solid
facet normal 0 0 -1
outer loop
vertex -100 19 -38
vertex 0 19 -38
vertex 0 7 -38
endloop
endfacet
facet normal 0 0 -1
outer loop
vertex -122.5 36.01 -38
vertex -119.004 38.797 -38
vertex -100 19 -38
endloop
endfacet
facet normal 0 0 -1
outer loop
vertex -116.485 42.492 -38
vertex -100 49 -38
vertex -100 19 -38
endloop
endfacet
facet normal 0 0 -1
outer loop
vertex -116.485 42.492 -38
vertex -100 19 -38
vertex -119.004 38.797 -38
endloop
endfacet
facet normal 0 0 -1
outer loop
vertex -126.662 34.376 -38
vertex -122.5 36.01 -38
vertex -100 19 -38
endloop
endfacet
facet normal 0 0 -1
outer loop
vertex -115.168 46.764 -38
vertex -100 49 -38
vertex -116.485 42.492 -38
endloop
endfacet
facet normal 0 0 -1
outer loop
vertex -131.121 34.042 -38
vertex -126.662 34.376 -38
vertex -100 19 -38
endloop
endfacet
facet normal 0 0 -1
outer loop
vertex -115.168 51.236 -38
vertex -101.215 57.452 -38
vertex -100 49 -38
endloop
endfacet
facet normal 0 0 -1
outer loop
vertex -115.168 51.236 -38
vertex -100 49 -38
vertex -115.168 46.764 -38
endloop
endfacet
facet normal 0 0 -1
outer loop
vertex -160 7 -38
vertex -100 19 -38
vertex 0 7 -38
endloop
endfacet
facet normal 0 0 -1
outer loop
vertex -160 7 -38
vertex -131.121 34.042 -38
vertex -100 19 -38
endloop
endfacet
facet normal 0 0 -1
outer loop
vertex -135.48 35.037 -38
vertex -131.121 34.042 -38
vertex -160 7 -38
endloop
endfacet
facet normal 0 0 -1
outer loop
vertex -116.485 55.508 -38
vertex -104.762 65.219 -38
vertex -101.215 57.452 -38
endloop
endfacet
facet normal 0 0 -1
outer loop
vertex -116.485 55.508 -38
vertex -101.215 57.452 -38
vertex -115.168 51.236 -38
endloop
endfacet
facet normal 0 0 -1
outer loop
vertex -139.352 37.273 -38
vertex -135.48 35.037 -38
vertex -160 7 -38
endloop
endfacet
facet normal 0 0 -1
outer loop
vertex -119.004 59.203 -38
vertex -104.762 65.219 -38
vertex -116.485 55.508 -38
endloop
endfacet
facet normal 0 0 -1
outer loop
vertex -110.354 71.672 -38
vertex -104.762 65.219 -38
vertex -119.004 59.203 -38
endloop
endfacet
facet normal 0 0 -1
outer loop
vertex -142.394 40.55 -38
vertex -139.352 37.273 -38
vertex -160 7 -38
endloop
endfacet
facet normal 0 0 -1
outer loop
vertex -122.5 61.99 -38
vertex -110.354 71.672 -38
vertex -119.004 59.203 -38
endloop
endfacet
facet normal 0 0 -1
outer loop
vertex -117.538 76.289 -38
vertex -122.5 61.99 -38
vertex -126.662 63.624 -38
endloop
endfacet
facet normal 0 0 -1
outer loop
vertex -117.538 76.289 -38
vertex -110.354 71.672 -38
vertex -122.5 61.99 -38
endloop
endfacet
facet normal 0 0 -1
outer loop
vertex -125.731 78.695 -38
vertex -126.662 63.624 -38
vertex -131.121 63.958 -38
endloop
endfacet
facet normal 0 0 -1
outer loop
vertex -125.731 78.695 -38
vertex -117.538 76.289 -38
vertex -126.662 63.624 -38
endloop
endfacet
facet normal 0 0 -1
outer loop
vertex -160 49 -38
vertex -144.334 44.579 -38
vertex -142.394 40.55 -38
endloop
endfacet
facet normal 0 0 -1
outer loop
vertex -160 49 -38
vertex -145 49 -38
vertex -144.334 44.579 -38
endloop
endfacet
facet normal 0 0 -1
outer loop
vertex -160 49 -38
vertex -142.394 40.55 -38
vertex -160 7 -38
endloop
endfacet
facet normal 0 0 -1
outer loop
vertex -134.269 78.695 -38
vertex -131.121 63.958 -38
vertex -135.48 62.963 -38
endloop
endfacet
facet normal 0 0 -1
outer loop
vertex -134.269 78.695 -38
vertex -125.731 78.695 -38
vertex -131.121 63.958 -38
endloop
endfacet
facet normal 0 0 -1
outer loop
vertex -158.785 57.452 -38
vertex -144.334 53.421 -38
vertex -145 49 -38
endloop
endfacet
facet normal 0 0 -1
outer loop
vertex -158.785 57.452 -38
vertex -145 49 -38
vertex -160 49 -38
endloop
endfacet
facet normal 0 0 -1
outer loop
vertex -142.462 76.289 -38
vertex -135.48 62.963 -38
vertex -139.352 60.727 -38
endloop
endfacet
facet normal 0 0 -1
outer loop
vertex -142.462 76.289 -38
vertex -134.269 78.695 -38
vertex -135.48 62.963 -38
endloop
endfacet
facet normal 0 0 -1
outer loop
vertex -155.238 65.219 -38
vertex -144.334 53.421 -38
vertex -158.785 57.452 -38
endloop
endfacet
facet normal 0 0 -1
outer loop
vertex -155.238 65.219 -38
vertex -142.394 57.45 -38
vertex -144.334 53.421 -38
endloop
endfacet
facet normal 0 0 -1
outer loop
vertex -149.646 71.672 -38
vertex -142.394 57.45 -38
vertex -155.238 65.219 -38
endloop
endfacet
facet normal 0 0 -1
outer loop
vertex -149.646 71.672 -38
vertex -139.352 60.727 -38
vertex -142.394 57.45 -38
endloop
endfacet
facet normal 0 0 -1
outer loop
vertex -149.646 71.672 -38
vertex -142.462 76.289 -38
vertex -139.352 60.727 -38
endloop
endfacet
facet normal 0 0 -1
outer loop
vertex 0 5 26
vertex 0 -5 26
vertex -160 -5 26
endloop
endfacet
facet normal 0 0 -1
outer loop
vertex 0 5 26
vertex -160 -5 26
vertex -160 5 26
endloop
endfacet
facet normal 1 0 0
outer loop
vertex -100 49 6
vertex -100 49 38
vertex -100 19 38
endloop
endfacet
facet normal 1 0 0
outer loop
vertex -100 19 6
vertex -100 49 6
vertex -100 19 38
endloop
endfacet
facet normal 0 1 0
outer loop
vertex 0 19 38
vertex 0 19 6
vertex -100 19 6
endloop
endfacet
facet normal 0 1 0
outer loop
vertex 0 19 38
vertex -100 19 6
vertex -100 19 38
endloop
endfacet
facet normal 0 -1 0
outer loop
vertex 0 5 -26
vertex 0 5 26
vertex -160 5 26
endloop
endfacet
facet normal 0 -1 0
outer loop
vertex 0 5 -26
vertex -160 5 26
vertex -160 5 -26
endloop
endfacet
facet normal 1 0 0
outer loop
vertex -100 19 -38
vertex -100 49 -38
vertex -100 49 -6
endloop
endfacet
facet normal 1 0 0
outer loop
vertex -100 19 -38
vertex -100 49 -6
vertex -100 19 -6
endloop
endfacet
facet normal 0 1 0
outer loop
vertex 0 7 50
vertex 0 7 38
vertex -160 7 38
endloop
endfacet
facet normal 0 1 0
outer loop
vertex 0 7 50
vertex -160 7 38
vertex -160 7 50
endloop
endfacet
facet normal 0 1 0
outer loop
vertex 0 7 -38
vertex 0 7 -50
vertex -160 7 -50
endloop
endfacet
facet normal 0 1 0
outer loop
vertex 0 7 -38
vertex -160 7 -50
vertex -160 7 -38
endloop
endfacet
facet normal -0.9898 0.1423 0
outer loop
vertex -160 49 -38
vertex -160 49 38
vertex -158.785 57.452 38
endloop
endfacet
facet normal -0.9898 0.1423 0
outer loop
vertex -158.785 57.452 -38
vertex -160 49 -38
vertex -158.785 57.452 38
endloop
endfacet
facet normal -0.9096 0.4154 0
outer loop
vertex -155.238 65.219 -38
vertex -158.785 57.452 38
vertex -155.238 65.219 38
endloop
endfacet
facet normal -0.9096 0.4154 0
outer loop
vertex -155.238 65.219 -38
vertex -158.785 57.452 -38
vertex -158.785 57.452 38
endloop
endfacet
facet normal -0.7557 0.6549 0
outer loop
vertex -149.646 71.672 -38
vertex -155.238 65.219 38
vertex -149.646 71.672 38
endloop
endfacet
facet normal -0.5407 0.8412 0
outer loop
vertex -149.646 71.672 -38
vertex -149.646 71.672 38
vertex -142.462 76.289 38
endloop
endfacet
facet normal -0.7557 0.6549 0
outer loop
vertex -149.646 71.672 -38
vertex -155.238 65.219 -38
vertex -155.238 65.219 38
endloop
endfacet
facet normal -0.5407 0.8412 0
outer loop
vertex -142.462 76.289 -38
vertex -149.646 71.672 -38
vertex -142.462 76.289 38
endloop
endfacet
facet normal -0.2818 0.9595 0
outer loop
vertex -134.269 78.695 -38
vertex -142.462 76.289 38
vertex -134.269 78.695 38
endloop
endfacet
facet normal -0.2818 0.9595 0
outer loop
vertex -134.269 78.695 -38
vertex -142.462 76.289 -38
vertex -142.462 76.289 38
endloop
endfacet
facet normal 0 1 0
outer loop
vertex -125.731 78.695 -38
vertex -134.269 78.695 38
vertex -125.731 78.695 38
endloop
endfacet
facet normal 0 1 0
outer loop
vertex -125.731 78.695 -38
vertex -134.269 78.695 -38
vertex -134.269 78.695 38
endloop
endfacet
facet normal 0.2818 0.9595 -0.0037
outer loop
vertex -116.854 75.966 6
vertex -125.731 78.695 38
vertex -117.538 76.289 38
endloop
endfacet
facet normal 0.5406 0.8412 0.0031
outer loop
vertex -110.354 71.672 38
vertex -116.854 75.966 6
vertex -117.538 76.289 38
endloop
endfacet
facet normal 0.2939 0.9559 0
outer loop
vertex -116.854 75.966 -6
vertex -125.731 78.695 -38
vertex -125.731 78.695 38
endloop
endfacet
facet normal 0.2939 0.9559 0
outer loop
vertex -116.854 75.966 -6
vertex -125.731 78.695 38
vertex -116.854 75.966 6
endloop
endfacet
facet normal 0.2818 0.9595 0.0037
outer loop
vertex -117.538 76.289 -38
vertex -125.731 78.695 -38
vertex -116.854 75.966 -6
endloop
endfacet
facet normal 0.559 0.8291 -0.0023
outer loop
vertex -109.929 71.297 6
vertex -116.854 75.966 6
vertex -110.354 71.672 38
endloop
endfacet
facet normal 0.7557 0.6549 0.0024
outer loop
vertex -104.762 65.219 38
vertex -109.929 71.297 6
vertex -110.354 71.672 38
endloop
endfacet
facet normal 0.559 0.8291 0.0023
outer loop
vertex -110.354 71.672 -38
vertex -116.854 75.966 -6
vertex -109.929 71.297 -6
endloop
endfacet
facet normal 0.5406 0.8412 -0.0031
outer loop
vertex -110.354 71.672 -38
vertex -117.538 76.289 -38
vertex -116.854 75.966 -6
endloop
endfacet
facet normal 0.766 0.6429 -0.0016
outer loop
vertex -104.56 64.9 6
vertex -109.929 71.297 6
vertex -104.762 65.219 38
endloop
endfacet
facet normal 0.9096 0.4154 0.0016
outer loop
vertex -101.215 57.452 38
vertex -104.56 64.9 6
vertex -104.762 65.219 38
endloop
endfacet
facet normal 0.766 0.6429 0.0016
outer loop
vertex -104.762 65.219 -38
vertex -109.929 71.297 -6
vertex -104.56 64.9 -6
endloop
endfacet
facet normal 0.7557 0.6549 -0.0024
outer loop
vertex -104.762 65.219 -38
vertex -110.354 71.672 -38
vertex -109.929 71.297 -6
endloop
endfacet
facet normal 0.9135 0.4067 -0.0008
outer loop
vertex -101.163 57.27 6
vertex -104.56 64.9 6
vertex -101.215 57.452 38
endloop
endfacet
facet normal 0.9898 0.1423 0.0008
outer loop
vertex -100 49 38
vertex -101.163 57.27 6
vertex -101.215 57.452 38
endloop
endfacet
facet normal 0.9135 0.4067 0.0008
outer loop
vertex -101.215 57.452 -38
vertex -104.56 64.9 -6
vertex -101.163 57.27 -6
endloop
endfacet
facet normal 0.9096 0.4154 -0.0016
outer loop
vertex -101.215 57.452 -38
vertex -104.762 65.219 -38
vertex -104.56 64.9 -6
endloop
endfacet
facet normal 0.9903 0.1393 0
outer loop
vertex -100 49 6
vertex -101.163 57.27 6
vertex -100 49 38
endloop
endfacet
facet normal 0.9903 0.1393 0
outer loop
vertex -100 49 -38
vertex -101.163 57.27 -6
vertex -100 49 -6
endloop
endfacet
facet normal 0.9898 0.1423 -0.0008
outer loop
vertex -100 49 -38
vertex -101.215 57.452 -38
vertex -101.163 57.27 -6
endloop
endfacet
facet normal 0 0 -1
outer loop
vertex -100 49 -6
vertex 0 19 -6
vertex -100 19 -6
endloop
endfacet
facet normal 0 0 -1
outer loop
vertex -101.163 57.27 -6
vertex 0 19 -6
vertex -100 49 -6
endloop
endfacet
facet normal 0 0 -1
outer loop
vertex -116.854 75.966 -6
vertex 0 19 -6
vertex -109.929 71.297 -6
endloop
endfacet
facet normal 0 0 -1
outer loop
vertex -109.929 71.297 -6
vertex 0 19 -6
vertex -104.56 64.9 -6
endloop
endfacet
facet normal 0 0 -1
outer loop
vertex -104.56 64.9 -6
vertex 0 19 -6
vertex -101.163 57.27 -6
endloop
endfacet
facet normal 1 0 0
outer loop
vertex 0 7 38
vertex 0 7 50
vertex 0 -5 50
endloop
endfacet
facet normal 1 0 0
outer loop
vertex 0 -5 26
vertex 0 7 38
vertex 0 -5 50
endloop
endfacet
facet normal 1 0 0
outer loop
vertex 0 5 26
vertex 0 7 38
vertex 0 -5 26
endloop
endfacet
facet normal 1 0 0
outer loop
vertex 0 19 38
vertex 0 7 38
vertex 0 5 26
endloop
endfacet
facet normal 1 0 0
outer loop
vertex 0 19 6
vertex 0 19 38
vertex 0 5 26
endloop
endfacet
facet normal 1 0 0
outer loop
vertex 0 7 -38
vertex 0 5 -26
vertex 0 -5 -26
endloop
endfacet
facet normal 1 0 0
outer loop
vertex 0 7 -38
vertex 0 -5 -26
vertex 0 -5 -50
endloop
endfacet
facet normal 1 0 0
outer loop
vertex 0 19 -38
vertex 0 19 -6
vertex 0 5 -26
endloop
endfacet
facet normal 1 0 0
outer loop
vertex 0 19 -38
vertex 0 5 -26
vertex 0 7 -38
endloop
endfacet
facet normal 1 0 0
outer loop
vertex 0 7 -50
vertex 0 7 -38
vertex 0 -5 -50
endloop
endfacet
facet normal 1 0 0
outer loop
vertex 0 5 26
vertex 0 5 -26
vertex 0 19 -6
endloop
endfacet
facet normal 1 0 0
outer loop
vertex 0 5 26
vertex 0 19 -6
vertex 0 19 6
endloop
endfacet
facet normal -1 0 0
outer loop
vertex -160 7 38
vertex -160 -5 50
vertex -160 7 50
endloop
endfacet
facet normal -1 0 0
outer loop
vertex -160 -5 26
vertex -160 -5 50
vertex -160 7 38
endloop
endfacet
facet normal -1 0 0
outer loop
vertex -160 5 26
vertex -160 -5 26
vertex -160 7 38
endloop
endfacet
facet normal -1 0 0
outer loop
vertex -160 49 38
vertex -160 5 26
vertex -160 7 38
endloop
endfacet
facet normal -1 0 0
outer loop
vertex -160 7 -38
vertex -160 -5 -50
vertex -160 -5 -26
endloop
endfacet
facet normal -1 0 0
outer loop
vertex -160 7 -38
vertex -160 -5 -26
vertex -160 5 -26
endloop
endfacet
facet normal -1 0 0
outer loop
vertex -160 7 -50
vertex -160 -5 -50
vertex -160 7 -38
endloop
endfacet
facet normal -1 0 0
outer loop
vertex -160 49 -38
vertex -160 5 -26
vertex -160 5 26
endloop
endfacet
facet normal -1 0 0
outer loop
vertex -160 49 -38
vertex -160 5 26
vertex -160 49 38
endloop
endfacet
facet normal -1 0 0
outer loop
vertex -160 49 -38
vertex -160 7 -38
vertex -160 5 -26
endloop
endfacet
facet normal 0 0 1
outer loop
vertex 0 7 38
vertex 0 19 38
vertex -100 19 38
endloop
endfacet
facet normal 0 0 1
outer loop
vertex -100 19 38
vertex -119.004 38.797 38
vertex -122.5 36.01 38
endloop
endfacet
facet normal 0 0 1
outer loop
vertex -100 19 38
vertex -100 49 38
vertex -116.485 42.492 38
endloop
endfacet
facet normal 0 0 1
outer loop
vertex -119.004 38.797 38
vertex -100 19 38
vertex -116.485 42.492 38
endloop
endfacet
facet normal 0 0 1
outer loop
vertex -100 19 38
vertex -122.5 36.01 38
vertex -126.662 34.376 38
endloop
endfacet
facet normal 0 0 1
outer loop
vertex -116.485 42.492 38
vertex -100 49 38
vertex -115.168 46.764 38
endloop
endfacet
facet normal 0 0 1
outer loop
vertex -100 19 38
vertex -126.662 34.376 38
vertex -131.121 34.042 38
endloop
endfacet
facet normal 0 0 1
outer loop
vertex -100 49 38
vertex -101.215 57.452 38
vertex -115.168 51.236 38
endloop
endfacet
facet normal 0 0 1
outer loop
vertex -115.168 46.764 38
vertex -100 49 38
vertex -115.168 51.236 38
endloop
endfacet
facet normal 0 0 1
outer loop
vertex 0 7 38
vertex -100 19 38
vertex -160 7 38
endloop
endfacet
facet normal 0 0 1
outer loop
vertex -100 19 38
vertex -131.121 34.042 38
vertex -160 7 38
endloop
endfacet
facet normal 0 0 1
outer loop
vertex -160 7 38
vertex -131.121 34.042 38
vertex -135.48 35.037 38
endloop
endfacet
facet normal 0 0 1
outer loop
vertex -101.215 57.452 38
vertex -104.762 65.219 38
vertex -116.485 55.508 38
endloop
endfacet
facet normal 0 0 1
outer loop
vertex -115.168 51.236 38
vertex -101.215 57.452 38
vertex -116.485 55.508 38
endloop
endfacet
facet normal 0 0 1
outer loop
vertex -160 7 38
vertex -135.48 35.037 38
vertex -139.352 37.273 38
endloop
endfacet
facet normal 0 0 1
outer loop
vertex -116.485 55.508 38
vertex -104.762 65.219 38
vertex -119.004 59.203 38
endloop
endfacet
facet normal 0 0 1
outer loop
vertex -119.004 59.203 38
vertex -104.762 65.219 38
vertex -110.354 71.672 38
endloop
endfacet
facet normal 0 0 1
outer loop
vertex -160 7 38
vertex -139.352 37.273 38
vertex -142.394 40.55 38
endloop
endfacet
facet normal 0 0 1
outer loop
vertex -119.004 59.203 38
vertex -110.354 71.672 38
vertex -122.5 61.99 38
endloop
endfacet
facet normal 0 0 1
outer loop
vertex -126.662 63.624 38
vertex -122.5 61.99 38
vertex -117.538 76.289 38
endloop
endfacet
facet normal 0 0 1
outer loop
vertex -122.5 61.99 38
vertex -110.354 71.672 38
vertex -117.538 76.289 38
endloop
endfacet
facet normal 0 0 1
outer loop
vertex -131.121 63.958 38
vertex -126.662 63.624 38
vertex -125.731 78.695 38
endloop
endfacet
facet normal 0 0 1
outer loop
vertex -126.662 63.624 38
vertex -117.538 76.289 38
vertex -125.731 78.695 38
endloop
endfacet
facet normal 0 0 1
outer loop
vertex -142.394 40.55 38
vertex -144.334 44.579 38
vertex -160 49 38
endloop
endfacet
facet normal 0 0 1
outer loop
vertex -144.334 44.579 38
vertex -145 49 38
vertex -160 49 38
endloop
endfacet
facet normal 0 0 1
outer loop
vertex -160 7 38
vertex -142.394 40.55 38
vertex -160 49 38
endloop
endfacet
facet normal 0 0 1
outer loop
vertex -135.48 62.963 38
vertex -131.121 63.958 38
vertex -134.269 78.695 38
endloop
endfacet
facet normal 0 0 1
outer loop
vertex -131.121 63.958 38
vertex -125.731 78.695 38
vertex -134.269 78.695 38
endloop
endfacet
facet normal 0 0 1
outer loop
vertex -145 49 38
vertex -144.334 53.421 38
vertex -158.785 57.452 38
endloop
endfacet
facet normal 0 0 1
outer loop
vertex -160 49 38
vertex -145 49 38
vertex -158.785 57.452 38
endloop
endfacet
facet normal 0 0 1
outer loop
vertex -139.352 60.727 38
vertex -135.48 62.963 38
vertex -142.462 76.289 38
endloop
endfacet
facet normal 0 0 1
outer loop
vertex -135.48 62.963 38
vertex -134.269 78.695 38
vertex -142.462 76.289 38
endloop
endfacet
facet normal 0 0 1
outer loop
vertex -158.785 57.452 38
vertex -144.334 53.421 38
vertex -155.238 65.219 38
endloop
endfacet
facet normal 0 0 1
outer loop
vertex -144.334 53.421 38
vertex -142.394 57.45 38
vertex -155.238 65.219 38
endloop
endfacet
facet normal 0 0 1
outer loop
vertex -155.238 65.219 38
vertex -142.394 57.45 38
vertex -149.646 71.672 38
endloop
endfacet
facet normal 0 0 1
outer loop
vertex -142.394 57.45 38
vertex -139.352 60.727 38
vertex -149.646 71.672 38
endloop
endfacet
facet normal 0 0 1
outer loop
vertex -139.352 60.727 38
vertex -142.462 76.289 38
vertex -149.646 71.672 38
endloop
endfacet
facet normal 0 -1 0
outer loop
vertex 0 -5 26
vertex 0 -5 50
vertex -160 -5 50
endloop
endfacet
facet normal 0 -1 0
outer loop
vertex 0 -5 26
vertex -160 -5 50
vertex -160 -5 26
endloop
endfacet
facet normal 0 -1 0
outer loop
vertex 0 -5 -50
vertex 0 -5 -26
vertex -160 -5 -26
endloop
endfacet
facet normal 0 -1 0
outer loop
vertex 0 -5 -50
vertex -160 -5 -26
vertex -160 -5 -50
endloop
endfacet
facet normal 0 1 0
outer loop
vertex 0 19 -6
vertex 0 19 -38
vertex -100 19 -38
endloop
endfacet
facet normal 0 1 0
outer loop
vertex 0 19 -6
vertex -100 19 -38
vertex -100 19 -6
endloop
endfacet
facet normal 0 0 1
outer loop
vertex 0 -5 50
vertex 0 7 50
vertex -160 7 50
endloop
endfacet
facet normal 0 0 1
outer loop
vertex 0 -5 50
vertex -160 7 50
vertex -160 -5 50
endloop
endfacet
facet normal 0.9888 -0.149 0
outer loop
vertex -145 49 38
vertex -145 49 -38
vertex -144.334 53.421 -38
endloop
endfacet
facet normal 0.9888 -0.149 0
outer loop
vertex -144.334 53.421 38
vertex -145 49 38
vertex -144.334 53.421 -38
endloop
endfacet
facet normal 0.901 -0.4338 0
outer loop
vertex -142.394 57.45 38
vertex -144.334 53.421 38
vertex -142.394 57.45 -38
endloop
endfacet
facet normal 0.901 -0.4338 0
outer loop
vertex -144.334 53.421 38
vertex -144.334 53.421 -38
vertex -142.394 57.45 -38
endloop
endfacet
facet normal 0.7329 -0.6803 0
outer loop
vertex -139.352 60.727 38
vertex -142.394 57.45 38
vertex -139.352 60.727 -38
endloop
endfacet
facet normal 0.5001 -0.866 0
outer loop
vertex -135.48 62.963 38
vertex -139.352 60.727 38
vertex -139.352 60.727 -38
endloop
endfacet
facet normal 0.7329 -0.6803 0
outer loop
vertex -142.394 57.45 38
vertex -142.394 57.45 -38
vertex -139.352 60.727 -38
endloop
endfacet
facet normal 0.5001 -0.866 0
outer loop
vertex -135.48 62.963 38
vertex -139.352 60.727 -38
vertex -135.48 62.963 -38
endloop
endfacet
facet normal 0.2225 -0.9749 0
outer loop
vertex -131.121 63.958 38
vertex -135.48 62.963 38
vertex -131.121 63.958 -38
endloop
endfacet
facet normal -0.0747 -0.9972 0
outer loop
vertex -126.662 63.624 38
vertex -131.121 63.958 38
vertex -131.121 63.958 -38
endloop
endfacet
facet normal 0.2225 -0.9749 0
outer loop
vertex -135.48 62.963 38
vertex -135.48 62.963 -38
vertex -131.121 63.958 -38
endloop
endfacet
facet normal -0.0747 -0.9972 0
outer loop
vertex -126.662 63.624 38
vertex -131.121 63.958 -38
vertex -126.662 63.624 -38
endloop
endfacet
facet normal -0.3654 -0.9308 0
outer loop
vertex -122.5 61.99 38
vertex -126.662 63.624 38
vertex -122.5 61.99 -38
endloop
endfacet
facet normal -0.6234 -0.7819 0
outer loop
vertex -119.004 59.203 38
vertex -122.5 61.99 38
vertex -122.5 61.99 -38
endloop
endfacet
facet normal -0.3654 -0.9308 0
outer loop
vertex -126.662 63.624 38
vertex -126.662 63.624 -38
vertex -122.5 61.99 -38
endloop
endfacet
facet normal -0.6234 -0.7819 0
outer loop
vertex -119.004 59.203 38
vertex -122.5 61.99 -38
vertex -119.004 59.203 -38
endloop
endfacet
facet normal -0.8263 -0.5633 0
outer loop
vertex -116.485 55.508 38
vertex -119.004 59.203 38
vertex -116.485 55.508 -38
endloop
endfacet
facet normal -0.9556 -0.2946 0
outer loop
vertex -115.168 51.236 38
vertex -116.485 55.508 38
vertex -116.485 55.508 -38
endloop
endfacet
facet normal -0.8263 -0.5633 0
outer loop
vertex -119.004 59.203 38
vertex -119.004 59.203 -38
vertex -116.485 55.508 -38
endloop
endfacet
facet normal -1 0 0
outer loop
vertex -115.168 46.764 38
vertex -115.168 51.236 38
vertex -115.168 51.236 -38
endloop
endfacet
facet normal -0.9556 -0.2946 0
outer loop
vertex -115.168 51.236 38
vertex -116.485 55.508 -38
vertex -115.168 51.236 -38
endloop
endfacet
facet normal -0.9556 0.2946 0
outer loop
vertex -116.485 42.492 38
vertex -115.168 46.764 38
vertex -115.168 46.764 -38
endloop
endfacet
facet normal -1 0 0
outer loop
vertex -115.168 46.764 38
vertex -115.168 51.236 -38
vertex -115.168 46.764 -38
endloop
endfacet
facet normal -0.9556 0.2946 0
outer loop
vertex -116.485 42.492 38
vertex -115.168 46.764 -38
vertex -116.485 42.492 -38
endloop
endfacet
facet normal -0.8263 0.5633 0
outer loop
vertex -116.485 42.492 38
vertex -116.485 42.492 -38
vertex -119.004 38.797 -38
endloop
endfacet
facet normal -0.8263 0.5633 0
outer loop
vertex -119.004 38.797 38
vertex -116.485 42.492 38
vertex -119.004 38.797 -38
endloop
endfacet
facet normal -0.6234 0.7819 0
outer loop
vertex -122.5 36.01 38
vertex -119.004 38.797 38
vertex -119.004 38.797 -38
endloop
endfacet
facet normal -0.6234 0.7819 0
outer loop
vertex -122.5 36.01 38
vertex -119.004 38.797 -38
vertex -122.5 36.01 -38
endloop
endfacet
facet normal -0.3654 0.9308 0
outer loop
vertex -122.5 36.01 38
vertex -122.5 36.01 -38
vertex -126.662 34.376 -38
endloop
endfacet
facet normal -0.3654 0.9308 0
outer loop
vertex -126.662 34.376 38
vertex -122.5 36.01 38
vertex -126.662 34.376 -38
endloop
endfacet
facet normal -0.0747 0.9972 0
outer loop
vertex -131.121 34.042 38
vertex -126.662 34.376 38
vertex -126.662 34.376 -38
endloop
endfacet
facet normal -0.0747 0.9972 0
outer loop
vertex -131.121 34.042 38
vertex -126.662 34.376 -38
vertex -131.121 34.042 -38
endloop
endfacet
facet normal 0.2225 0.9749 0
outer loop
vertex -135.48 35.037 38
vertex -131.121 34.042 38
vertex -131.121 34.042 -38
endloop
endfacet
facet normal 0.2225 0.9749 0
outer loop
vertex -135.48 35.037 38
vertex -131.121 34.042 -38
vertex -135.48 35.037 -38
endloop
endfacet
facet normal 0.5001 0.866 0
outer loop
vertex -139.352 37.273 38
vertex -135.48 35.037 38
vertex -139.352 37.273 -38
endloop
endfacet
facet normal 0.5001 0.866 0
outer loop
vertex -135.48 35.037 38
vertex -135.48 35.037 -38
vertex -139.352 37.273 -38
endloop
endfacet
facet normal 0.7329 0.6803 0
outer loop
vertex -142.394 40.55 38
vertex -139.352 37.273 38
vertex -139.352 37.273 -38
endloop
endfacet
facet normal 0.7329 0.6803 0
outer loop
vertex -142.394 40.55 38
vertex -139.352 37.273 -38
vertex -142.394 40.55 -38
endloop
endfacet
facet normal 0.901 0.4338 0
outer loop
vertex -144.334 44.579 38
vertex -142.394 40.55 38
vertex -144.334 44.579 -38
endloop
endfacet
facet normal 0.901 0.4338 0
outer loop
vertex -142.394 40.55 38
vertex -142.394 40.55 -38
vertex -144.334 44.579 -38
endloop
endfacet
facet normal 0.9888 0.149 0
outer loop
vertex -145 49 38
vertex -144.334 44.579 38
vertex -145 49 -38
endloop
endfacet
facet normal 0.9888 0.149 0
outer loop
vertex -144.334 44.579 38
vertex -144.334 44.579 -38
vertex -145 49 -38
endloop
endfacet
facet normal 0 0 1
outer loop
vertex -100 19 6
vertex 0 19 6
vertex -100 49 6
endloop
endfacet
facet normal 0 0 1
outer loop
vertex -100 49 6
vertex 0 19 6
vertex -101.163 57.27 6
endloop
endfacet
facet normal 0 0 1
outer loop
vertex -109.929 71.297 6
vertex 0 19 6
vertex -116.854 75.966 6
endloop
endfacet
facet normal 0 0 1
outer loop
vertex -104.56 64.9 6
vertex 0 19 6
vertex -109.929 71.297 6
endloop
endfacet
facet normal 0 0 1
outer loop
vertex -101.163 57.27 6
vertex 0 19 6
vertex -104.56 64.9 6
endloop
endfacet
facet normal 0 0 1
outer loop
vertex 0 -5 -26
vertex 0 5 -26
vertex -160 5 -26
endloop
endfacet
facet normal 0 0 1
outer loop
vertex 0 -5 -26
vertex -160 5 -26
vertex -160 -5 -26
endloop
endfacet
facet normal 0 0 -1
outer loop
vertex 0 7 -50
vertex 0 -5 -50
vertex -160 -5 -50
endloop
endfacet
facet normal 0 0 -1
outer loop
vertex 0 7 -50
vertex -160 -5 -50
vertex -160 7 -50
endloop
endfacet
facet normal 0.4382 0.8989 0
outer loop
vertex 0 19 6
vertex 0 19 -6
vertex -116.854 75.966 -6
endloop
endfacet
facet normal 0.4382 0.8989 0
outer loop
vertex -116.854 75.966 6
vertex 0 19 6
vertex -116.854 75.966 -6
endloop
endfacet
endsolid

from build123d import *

# Parameters (mm, degrees)
BOSS_EXTRUDE1_DEPTH = 160
SKETCH2_R           = 15
BOSS_EXTRUDE4_DEPTH = 76
RIB4_REACH          = 187.313
SKETCH5_WALL_W      = 502.626496624
SKETCH5_WALL_H      = 12


with BuildPart() as part:
    # Sketch1 → Boss-Extrude1 (new body)
    with BuildSketch(Plane(origin=(0, 0, 0), x_dir=(0, 0, -1), z_dir=(1, 0, 0))):
        Polygon((-26, 5), (26, 5), (26, -5), (50, -5), (50, 7), (38, 7), (38, 19), (-38, 19), (-38, 7), (-50, 7), (-50, -5), (-26, -5), align=None)
    extrude(amount=-BOSS_EXTRUDE1_DEPTH)

    # Sketch2 → Boss-Extrude4 (add)
    with BuildSketch(Plane(origin=(0, 0, -38), x_dir=(-1, 0, 0), z_dir=(0, 0, -1))):
        with BuildLine():
            Line((160, 19), (160, 49))
            ThreePointArc((160, 49), (130, 79), (100, 49))
            Line((100, 49), (100, 19))
            Line((100, 19), (160, 19))
        make_face()
        with Locations((130, 49)):
            Circle(SKETCH2_R, mode=Mode.SUBTRACT)
    extrude(amount=-BOSS_EXTRUDE4_DEPTH)

    # Sketch5 wall → Rib4 (add, up to next)
    with BuildSketch(Plane(origin=(-58.426966292, 47.483146068, 0), x_dir=(-0.898876404493, 0.438202247193, 0), z_dir=(-0.438202247193, -0.898876404493, 0)), mode=Mode.PRIVATE) as rib4_sk1:
        Rectangle(SKETCH5_WALL_W, SKETCH5_WALL_H)
    rib4_tool1 = extrude(rib4_sk1.sketch, amount=RIB4_REACH, mode=Mode.PRIVATE) - part.part
    add(rib4_tool1.solids().sort_by_distance((-58.426966292, 47.483146068, 0))[0])


solid = part.part
